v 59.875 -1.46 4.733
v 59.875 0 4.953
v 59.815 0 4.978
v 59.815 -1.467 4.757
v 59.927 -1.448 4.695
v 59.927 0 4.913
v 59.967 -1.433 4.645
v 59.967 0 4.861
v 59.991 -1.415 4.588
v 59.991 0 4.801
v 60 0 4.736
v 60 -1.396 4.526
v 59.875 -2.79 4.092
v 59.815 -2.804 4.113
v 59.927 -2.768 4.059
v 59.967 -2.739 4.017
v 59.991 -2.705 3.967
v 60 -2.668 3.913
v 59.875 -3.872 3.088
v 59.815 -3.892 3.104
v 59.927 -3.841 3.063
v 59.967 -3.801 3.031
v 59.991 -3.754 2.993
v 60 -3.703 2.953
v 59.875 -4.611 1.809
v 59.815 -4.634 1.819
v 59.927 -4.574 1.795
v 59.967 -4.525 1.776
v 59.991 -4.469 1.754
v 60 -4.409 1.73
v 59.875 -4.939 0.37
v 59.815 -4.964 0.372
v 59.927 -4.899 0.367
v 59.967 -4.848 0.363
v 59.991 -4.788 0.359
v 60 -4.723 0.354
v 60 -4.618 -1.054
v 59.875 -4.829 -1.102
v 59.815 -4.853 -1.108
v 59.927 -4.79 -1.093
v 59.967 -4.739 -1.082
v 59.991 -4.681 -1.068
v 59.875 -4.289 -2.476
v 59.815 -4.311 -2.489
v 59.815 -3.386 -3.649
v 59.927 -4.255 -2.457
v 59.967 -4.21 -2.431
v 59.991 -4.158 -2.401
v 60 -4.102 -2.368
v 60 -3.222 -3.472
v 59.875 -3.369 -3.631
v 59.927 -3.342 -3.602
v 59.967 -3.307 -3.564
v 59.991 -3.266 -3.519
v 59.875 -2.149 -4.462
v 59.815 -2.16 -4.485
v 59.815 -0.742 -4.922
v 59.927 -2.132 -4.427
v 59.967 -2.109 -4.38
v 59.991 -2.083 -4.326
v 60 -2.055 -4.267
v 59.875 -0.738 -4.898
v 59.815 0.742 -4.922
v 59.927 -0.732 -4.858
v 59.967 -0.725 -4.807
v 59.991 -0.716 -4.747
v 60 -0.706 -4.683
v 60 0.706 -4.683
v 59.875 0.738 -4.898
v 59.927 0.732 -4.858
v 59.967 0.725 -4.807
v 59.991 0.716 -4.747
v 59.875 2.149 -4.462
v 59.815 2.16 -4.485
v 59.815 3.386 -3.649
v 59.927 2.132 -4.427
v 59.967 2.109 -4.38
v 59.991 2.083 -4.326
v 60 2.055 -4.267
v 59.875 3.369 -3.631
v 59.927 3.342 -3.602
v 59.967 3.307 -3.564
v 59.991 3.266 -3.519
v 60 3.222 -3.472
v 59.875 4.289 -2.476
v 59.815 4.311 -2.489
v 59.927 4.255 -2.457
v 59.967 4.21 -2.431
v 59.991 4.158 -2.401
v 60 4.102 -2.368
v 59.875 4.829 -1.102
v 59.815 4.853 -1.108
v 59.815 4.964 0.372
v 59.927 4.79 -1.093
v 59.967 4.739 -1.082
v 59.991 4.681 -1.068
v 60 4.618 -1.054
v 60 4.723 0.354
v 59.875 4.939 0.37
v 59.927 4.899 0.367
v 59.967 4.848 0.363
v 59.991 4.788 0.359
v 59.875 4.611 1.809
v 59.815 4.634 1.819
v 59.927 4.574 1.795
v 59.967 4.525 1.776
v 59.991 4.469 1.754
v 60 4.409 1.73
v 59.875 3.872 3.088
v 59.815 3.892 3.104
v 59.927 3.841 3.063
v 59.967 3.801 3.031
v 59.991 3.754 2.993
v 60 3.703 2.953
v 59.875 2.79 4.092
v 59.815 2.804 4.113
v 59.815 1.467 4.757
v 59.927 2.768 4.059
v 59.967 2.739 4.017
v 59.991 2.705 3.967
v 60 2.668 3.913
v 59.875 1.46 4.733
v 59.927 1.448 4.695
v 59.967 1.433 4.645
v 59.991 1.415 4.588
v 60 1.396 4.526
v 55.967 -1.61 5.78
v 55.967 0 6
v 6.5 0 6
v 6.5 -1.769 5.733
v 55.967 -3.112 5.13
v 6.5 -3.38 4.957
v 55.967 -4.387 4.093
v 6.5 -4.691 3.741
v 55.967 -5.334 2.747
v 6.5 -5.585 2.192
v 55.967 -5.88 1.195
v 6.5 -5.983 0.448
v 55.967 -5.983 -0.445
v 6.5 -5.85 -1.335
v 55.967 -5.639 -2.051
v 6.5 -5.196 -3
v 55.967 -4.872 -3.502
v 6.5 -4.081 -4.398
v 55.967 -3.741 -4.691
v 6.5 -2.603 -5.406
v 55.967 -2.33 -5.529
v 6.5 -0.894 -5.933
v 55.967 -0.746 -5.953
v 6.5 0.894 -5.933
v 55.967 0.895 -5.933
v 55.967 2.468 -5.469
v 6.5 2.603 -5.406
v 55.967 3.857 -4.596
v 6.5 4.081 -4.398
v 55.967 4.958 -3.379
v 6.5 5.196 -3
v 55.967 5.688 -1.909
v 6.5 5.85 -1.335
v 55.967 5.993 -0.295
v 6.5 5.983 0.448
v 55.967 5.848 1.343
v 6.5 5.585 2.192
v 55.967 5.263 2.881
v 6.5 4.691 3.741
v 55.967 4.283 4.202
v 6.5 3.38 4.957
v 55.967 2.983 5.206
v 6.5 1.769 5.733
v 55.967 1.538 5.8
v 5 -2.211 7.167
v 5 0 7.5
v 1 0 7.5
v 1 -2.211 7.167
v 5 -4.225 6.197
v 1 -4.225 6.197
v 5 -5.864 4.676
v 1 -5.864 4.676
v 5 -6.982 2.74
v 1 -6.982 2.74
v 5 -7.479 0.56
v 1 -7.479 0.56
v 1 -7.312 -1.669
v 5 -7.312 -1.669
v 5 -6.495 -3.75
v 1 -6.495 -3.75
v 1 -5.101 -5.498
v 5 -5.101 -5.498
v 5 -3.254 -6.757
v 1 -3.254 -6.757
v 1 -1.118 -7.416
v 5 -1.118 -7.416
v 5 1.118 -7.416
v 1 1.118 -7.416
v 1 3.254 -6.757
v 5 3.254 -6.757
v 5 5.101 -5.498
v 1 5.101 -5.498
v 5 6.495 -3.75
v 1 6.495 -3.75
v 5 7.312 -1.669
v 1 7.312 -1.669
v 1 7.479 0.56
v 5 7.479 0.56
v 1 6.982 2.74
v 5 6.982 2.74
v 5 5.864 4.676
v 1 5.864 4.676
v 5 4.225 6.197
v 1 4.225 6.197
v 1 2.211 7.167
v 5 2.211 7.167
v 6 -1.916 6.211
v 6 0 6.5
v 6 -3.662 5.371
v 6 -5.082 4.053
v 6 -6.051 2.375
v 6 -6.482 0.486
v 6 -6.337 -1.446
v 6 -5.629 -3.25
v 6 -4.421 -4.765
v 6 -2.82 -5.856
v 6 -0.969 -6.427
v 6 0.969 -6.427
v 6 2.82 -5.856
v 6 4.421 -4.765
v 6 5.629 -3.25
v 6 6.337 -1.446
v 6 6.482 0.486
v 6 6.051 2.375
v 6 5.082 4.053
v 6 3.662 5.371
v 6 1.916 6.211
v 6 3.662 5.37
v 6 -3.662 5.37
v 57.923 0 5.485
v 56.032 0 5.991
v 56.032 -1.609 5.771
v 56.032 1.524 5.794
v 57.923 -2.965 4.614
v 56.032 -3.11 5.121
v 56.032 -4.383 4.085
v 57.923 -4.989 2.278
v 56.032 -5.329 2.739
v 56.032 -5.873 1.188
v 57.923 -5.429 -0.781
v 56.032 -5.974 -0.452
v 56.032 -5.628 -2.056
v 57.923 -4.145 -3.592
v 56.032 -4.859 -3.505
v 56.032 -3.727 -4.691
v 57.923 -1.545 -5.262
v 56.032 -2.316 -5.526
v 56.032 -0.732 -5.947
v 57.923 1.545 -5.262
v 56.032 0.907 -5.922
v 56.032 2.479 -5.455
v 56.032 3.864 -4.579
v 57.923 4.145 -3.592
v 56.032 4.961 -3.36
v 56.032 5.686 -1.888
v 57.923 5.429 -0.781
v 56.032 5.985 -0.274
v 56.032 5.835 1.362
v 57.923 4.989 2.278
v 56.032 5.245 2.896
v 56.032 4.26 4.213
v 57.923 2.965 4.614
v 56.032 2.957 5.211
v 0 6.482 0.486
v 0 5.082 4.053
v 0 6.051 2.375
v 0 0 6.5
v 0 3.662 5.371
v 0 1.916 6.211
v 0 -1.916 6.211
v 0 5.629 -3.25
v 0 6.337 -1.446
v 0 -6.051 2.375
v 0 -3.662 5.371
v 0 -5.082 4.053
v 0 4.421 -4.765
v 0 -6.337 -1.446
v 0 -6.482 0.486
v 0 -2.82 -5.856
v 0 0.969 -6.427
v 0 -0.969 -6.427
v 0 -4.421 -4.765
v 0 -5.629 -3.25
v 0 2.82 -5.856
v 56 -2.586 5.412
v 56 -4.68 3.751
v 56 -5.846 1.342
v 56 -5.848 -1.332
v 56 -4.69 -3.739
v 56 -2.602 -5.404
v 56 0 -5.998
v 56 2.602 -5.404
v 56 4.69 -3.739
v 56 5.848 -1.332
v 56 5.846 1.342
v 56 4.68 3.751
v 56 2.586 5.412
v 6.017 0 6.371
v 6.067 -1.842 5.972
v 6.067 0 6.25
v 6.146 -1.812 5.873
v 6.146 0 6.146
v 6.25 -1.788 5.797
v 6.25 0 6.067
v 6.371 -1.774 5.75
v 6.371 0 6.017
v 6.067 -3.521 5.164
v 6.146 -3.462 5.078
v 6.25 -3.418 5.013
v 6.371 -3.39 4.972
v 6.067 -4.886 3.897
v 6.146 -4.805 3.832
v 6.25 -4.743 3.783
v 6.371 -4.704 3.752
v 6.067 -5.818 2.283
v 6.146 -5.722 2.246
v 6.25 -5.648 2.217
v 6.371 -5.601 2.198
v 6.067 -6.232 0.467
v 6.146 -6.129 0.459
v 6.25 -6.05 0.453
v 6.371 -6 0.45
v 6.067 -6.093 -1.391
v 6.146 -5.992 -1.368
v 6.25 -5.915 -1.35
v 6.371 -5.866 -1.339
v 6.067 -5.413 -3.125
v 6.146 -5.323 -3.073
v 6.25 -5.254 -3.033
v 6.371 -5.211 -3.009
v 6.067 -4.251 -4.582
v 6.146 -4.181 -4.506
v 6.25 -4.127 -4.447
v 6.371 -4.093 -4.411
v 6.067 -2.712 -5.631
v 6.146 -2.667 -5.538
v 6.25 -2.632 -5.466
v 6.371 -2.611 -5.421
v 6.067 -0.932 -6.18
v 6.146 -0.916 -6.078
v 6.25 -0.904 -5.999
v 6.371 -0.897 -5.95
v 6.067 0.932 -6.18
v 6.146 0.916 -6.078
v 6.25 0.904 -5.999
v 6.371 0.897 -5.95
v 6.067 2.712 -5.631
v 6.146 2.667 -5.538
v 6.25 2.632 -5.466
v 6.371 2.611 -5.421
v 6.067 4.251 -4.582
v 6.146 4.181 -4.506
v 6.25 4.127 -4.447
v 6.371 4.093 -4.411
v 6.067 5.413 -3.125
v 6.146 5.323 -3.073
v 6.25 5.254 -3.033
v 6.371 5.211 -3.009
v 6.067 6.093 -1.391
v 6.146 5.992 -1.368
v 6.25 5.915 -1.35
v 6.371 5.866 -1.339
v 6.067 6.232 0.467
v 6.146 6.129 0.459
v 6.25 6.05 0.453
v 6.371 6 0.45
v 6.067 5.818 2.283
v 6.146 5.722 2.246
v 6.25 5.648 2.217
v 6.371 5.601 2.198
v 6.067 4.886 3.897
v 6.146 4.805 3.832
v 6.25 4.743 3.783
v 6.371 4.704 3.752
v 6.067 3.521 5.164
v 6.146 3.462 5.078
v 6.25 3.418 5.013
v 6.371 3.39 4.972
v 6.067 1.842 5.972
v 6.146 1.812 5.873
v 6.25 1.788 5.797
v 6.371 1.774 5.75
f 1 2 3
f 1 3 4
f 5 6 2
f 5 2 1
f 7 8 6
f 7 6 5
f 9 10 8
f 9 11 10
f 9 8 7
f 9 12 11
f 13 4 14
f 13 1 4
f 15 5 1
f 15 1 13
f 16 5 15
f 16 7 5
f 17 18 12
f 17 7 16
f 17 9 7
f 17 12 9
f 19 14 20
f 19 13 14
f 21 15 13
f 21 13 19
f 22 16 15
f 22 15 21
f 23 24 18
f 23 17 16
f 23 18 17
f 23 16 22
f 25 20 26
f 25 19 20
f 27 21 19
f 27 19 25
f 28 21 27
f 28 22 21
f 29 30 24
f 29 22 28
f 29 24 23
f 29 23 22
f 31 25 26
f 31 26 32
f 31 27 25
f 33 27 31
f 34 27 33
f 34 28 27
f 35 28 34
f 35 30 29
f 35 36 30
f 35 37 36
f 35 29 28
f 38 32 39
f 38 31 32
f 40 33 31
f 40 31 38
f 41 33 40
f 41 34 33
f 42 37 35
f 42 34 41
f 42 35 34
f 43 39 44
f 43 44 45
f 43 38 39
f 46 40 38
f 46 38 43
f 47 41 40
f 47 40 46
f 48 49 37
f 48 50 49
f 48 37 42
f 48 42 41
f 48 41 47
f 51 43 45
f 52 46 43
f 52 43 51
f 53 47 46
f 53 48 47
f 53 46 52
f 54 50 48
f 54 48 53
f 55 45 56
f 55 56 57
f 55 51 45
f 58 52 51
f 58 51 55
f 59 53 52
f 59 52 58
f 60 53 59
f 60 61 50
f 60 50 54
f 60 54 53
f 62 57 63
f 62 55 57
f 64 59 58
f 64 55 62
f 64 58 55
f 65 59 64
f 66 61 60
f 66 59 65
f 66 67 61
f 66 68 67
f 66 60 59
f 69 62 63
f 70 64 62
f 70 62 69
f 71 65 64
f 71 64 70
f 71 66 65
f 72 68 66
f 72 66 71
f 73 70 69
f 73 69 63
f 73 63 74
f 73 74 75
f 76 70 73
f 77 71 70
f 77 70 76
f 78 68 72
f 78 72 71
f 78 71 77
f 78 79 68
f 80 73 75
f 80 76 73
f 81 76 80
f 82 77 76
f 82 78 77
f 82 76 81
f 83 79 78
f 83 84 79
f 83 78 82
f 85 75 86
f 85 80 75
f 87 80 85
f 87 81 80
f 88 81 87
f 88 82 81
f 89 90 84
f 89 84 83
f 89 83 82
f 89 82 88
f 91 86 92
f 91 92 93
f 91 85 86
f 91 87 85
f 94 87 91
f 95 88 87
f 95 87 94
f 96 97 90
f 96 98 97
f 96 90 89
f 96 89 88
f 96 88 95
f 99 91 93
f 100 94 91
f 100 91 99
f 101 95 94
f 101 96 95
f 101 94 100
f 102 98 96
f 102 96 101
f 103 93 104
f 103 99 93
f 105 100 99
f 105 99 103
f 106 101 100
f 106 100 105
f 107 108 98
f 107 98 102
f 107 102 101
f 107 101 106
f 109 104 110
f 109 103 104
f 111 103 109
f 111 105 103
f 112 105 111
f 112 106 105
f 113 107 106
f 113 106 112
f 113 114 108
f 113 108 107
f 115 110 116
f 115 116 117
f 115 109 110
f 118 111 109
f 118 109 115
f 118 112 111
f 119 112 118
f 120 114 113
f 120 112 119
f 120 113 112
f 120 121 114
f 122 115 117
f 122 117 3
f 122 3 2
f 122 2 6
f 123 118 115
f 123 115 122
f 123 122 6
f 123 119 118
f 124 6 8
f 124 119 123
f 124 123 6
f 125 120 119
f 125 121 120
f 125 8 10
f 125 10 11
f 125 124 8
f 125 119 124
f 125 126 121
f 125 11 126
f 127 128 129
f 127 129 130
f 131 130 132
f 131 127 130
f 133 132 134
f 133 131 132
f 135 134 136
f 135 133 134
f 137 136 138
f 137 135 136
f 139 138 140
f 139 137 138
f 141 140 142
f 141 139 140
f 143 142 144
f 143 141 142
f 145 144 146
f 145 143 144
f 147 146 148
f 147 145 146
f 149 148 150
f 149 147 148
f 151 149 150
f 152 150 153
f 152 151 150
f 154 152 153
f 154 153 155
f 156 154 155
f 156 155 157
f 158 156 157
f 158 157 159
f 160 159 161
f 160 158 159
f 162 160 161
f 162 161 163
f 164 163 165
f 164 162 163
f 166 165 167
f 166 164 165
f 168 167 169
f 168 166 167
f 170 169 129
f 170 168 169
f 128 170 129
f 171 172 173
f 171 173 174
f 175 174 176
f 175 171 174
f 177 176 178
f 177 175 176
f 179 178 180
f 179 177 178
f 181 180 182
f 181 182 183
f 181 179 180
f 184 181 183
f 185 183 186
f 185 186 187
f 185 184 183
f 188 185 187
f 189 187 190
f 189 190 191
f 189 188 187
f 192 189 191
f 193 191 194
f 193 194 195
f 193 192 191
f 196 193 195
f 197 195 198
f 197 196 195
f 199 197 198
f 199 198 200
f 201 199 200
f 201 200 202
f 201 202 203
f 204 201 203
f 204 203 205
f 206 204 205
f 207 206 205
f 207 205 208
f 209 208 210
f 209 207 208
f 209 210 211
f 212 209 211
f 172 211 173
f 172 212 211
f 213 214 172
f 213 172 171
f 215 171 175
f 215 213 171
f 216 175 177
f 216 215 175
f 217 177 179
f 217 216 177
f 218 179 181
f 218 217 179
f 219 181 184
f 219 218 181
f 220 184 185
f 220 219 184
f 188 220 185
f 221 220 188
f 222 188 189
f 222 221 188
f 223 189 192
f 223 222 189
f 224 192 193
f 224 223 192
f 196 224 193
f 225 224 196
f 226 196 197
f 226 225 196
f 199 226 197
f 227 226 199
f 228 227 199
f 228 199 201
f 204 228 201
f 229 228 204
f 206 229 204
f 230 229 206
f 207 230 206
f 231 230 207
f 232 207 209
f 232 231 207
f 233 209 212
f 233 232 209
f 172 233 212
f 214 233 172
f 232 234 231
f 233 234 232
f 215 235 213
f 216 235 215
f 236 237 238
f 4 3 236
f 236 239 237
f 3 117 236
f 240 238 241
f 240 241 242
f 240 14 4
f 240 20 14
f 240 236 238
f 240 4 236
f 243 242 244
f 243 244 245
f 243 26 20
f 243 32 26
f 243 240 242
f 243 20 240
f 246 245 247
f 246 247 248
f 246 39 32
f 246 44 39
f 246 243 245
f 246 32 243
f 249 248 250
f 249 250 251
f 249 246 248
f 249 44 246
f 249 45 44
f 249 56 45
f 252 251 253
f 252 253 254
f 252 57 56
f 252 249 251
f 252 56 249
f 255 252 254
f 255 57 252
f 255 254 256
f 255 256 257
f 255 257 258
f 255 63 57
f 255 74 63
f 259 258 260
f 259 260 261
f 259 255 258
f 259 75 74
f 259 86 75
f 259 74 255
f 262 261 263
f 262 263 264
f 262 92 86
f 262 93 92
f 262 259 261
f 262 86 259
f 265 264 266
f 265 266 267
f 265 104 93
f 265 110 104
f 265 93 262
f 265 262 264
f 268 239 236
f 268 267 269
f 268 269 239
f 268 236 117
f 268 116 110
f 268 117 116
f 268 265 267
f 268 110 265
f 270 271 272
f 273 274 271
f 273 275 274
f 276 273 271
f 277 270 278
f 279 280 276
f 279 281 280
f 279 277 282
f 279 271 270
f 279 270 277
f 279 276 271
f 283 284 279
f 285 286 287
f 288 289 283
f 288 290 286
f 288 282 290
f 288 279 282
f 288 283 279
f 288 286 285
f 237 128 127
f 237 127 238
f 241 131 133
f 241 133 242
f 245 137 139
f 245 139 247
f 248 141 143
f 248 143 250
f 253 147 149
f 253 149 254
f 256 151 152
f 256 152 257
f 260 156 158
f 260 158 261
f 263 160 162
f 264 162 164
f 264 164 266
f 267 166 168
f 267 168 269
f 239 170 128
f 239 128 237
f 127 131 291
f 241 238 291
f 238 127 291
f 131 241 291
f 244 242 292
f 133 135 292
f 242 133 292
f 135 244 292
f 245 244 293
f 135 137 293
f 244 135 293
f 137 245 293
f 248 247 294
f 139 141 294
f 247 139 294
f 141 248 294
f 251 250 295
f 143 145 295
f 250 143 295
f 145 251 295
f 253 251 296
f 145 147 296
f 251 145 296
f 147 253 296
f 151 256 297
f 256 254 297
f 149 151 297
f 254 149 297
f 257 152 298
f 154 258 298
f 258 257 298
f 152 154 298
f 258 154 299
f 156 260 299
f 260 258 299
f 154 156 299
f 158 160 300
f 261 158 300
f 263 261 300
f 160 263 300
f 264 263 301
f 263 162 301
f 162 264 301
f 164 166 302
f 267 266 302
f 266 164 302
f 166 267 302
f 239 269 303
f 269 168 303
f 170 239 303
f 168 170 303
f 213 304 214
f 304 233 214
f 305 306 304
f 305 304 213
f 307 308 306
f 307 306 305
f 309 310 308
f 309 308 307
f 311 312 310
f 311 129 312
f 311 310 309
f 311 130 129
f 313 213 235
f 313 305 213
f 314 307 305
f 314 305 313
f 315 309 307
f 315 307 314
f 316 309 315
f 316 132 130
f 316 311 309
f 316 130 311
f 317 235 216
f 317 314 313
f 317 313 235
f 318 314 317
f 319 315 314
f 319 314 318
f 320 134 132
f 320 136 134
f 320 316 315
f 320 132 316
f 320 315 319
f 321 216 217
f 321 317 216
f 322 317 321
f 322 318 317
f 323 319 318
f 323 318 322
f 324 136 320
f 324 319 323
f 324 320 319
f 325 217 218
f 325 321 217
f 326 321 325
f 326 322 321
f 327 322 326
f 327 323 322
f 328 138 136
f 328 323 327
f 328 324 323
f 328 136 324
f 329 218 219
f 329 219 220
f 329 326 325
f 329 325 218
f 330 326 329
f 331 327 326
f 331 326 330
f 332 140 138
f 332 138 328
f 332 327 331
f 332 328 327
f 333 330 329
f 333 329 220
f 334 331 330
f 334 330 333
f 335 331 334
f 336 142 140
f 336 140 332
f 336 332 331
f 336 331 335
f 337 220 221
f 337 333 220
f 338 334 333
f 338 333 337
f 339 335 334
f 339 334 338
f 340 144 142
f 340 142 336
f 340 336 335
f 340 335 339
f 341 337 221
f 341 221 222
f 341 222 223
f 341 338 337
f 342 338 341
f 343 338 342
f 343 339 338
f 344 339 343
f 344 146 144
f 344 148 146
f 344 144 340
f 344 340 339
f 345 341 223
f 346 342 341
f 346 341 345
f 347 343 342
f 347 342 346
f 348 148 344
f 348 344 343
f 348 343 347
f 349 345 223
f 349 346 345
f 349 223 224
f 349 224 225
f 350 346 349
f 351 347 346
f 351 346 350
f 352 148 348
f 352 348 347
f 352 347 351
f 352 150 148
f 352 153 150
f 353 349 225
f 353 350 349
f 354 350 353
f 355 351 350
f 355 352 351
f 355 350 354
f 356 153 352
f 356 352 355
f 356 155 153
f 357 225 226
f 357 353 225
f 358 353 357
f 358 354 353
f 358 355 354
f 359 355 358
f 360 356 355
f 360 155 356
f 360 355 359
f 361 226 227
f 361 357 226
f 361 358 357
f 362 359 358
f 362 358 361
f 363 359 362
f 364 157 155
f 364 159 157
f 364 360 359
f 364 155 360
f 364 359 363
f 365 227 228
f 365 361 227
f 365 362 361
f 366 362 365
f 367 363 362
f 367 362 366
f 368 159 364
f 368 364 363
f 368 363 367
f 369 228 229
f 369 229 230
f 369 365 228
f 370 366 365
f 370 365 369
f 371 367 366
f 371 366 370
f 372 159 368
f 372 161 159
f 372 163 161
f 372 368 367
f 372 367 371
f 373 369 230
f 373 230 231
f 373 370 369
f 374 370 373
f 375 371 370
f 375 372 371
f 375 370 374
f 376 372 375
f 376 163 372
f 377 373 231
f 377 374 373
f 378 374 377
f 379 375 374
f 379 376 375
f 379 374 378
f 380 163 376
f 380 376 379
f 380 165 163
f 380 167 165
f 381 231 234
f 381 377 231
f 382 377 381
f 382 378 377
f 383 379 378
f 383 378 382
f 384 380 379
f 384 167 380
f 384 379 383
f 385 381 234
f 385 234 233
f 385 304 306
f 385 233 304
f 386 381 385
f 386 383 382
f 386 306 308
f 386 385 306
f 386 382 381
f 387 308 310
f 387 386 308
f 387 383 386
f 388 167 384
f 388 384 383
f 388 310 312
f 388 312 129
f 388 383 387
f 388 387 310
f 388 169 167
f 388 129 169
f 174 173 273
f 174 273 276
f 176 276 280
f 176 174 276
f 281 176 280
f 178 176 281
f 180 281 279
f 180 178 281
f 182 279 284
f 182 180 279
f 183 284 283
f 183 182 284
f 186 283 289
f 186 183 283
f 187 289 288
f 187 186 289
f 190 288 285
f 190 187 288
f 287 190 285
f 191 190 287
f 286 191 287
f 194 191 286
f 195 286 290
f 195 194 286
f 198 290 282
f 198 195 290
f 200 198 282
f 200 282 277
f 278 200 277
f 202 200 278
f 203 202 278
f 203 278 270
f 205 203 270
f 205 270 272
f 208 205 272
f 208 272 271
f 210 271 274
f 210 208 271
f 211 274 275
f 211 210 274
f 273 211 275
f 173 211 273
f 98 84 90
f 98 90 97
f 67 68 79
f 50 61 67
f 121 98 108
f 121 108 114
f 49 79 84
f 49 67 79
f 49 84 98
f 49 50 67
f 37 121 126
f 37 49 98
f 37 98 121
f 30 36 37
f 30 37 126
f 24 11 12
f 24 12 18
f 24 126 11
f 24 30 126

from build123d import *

# Parameters (mm, degrees)
CHAMFER_1_SIZE = 1
FILLET_1_R     = 0.5
FILLET_2_R     = 0.25


with BuildPart() as part:
    # 草图2 → 旋转1 (revolve)
    with BuildSketch(Plane.XY, mode=Mode.PRIVATE) as revolve_1_sk:
        Polygon((0, 0), (0, 7.5), (6, 7.5), (6, 6), (56, 6), (60, 4.92820323), (60, 0), align=None)
    revolve(revolve_1_sk.sketch.rotate(Axis((-70.654432031, 0, 0), (1, 0, 0)), 90), axis=Axis((-70.654432031, 0, 0), (1, 0, 0)))

    # 倒角1
    chamfer_1_edges = [part.edges().sort_by_distance(p)[0] for p in [
        (6, 0, -7.5),
        (0, 0, -7.5),
    ]]
    chamfer(chamfer_1_edges, length=CHAMFER_1_SIZE)

    # 圆角1
    fillet_1_edges = [part.edges().sort_by_distance(p)[0] for p in [
        (6, 0, -6),
    ]]
    fillet(fillet_1_edges, radius=FILLET_1_R - 0.0001)  # a hair under: the kernel refuses the full size

    # 圆角2
    fillet_2_edges = [part.edges().sort_by_distance(p)[0] for p in [
        (60, 0, -4.92820323),
        (56, 0, -6),
    ]]
    fillet(fillet_2_edges, radius=FILLET_2_R)


solid = part.part
